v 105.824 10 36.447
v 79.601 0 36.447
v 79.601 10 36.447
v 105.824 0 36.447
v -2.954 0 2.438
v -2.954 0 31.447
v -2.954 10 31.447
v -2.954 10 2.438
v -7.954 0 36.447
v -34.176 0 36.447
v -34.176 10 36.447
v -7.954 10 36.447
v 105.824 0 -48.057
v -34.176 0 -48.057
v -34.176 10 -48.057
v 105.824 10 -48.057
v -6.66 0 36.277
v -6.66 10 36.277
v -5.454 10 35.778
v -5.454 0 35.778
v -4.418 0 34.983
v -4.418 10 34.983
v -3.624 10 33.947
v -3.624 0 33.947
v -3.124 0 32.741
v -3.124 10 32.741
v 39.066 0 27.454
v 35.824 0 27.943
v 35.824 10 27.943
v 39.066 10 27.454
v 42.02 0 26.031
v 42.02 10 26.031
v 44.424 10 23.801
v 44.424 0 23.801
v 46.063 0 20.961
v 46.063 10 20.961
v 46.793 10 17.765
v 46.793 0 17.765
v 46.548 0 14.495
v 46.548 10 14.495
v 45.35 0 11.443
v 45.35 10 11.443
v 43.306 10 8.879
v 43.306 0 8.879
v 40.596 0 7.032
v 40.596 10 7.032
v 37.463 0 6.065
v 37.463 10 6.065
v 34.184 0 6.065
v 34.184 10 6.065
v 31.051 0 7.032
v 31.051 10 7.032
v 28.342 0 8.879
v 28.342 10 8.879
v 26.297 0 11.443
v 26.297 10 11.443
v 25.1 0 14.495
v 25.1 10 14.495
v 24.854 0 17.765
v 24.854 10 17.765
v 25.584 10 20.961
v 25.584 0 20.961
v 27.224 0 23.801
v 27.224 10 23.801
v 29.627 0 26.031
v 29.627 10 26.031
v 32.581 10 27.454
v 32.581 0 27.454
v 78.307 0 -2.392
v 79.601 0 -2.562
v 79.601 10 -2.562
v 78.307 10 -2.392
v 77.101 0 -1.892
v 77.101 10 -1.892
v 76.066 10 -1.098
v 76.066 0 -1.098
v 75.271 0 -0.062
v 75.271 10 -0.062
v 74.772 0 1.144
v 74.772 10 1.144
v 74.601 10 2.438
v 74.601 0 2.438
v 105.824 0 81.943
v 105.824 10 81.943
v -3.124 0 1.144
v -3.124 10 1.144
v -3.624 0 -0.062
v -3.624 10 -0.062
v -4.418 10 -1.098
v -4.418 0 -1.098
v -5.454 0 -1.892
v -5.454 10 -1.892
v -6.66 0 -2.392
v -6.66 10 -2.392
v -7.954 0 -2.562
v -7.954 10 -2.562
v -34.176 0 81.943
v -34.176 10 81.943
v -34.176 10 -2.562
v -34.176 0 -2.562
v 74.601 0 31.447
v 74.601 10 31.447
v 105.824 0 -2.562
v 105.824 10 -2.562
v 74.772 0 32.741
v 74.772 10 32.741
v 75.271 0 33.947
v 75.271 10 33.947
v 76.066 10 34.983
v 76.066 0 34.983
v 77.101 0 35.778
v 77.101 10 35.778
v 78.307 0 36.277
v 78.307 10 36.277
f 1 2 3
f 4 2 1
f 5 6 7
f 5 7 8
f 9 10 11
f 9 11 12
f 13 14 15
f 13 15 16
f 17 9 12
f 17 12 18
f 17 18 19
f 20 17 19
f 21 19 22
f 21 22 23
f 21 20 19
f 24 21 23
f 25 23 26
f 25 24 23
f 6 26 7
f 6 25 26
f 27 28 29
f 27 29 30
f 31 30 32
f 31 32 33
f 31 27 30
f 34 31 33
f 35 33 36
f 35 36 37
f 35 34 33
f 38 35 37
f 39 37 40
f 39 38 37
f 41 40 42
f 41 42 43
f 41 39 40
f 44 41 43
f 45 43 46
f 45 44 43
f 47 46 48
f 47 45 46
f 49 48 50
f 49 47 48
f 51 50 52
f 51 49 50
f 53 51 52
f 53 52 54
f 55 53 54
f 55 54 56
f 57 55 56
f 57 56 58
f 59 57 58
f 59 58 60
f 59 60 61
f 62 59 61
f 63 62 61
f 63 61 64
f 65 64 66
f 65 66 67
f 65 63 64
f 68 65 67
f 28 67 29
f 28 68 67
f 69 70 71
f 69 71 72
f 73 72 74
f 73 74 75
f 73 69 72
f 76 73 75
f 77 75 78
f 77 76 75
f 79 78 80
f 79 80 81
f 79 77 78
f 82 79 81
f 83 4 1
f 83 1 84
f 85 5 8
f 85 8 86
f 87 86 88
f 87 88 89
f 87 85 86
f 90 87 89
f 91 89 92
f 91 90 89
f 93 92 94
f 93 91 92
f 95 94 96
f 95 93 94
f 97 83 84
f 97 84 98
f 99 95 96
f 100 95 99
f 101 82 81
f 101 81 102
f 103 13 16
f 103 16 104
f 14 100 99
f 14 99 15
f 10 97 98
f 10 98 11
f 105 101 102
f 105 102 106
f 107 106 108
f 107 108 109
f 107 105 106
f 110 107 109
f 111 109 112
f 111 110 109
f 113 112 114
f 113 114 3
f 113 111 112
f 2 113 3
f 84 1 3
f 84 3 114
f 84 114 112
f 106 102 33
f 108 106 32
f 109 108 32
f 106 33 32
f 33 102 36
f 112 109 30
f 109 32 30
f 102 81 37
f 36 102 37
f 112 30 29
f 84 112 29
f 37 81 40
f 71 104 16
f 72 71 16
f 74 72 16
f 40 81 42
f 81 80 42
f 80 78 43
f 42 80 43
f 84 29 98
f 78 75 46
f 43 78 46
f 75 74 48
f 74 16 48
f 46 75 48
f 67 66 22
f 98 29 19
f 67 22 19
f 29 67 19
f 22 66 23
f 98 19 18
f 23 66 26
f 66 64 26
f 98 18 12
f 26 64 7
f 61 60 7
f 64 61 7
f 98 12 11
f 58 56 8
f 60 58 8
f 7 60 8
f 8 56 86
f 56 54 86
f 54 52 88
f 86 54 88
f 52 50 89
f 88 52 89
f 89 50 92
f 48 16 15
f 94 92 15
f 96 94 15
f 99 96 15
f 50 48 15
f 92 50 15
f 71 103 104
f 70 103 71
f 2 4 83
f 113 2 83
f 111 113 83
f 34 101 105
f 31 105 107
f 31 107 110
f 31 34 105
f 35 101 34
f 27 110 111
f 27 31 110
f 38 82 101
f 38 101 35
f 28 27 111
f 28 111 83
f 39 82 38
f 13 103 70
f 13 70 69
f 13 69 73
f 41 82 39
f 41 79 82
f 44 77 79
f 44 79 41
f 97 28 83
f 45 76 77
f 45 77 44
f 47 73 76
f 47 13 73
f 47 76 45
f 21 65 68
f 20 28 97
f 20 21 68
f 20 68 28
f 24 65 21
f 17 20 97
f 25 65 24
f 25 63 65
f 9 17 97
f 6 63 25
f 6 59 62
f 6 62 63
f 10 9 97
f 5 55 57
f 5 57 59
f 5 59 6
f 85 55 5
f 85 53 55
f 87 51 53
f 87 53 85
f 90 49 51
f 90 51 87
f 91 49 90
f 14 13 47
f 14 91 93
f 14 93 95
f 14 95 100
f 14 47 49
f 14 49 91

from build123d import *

# Parameters (mm, degrees)
SKETCH_1_R      = 11
EXTRUDE_1_DEPTH = 10


with BuildPart() as part:
    # Эскиз1 → Вытянуть1 (new body)
    with BuildSketch(Plane(origin=(0, 0, 0), x_dir=(1, 0, 0), z_dir=(0, 1, 0))):
        with BuildLine():
            Line((-34.176272466, 48.057375978), (105.823727534, 48.057375978))
            Line((105.823727534, 48.057375978), (105.823727534, 2.562145774))
            Line((105.823727534, 2.562145774), (79.601322316, 2.562145774))
            ThreePointArc((79.601322316, 2.562145774), (76.06578841, 1.09767968), (74.601322316, -2.437854226))
            Line((74.601322316, -2.437854226), (74.601322316, -31.447393818))
            ThreePointArc((74.601322316, -31.447393818), (76.06578841, -34.982927724), (79.601322316, -36.447393818))
            Line((79.601322316, -36.447393818), (105.823727534, -36.447393818))
            Line((105.823727534, -36.447393818), (105.823727534, -81.942624022))
            Line((105.823727534, -81.942624022), (-34.176272466, -81.942624022))
            Line((-34.176272466, -81.942624022), (-34.176272466, -36.447393818))
            Line((-34.176272466, -36.447393818), (-7.953867248, -36.447393818))
            ThreePointArc((-7.953867248, -36.447393818), (-4.418333342, -34.982927724), (-2.953867248, -31.447393818))
            Line((-2.953867248, -31.447393818), (-2.953867248, -2.437854226))
            ThreePointArc((-2.953867248, -2.437854226), (-4.418333342, 1.09767968), (-7.953867248, 2.562145774))
            Line((-7.953867248, 2.562145774), (-34.176272466, 2.562145774))
            Line((-34.176272466, 2.562145774), (-34.176272466, 48.057375978))
        make_face()
        with Locations(Location((35.823727534, -16.942624022, 0), (0, 0, 270))):
            Circle(SKETCH_1_R, mode=Mode.SUBTRACT)
    extrude(amount=EXTRUDE_1_DEPTH)


solid = part.part
